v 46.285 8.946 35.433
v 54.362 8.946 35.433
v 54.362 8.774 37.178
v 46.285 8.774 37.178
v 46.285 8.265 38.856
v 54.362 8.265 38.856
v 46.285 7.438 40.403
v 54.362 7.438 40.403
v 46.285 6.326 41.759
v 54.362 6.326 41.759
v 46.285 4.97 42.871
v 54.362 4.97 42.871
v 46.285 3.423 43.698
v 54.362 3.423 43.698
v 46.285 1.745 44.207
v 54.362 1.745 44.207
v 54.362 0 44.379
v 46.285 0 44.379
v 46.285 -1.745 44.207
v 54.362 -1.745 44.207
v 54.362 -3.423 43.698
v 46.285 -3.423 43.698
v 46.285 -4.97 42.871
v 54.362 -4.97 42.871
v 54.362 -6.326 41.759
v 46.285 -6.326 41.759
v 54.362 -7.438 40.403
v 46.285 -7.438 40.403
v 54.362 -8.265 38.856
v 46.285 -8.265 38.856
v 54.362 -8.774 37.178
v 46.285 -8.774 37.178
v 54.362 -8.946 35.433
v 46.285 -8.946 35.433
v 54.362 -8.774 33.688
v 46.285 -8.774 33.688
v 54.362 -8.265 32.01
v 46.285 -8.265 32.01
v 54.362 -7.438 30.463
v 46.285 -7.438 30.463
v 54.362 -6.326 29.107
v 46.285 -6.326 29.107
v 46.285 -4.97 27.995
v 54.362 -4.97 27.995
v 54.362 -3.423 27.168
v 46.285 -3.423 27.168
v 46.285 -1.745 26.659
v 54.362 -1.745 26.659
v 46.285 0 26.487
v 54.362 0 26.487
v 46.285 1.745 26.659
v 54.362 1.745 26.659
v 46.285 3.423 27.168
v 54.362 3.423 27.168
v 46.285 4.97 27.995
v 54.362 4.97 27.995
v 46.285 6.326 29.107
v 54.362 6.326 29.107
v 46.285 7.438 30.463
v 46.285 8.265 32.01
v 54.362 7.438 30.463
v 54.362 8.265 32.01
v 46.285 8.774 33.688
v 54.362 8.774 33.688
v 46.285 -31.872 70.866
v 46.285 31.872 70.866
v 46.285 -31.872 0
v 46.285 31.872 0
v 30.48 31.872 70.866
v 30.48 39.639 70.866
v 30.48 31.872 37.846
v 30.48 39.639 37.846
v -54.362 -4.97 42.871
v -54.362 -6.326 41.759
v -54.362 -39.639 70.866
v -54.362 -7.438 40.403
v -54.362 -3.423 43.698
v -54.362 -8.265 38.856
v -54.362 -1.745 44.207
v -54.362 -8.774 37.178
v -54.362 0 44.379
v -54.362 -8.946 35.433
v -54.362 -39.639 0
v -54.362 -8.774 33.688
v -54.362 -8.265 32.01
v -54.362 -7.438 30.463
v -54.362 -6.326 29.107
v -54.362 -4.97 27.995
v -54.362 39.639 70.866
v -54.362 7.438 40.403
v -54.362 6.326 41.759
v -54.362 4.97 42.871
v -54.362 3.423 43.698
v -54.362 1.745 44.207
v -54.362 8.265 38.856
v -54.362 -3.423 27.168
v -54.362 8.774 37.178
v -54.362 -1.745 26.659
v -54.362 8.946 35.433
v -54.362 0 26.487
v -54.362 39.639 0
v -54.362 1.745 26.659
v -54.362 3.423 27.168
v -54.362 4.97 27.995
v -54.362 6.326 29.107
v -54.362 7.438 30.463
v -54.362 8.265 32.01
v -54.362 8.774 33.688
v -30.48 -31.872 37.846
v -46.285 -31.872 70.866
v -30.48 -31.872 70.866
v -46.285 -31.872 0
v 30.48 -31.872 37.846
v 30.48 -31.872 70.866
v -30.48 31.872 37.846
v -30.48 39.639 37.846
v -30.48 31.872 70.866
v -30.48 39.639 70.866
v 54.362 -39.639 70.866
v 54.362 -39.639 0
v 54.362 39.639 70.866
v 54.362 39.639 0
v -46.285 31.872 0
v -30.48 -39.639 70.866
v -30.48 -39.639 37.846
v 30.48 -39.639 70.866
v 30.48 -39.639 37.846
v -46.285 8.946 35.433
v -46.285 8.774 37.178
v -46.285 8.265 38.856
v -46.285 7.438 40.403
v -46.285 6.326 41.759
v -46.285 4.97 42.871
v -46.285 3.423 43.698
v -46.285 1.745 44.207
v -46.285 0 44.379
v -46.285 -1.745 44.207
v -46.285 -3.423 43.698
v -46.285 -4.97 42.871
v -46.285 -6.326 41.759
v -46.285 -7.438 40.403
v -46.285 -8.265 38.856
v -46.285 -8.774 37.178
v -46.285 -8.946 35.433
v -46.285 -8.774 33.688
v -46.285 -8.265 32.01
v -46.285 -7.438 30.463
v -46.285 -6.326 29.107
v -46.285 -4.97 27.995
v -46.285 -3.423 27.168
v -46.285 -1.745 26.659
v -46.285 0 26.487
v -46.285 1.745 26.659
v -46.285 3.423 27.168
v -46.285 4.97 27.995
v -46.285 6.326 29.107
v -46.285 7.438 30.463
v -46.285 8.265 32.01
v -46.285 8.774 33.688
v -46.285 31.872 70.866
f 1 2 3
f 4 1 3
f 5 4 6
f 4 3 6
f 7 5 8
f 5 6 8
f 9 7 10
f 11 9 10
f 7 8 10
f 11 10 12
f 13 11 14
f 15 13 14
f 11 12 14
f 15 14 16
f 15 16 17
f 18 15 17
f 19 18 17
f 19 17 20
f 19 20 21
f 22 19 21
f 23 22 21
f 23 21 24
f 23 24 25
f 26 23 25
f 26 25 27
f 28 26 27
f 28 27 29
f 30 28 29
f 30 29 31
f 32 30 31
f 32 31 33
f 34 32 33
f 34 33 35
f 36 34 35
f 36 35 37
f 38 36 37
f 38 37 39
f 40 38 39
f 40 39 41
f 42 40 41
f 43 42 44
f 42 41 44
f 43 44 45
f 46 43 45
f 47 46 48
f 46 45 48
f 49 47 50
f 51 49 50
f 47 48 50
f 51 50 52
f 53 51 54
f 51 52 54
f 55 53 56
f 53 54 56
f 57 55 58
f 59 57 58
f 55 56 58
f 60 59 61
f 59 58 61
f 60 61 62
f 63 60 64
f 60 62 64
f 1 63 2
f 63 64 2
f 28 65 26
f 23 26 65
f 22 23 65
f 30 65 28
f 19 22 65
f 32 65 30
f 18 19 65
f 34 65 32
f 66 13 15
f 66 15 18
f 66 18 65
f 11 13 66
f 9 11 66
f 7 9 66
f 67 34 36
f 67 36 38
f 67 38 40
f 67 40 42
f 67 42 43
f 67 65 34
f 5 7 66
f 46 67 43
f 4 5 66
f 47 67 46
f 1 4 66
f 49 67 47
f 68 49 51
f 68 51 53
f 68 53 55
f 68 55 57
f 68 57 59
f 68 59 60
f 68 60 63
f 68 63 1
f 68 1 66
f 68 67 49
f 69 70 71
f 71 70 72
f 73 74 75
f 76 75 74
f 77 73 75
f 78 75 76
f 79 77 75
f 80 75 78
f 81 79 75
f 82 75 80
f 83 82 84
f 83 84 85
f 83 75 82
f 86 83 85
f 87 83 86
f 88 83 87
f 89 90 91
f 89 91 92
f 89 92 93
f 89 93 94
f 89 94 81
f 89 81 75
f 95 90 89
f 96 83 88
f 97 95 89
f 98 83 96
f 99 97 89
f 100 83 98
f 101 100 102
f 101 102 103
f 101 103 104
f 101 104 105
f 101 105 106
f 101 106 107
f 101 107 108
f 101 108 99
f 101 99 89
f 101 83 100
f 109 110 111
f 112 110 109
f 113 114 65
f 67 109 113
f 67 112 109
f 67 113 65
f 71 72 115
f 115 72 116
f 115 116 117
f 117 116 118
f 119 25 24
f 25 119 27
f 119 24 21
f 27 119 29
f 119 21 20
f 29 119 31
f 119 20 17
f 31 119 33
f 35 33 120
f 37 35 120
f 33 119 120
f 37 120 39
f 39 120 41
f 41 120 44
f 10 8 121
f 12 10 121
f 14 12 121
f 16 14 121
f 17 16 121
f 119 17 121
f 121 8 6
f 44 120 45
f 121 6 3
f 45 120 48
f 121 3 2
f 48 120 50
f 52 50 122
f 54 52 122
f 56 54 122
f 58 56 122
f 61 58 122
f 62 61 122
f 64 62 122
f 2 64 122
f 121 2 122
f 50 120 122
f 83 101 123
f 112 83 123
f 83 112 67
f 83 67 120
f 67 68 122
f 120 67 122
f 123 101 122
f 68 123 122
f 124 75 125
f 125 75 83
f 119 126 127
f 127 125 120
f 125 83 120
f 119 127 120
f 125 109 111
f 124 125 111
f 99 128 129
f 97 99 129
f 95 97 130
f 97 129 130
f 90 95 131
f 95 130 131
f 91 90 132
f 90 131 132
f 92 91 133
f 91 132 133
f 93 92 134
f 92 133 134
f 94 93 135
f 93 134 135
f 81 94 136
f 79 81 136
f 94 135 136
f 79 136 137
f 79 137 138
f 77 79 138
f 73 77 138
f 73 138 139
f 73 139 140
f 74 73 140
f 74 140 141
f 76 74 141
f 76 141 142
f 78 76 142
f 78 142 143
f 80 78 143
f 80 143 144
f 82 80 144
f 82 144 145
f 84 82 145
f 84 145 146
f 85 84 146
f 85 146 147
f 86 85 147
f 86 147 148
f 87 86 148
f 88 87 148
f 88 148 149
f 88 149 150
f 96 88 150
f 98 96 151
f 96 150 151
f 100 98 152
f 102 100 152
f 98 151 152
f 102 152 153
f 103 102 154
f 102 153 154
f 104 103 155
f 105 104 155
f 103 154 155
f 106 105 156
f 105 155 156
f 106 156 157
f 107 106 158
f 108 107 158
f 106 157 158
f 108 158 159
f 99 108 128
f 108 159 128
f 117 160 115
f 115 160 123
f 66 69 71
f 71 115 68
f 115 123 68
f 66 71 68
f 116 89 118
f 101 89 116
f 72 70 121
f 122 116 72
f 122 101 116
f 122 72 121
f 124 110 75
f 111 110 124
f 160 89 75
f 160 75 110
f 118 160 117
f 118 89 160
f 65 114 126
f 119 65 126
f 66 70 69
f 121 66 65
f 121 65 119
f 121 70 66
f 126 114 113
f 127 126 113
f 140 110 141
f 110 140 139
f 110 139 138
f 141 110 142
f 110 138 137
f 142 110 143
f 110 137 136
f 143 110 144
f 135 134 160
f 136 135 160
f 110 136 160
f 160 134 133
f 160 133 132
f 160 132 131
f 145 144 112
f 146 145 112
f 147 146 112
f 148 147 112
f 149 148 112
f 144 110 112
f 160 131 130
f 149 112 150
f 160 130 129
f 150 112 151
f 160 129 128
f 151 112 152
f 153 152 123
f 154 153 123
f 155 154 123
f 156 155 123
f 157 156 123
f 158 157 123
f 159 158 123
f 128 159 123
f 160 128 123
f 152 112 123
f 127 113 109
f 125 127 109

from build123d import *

# Parameters (mm, degrees)
F0_W     = 108.723074
F0_H     = 79.27715
F0_W_2   = 92.569218
F0_H_2   = 63.744598
F1_DEPTH = 70.866
F2_R     = 8.945792
F3_DEPTH = 254
F5_DEPTH = 254


with BuildPart() as f1:
    # F0 (on Top) → F1 (new body)
    with BuildSketch(Plane.XY):
        Rectangle(F0_W, F0_H)
        Rectangle(F0_W_2, F0_H_2, mode=Mode.SUBTRACT)
    extrude(amount=F1_DEPTH)

    # F2 (on face) → F3 (cut)
    with BuildSketch(Plane.YZ.offset(54.361537)):
        with Locations((0, 35.433)):
            Circle(F2_R)
    extrude(amount=-F3_DEPTH, mode=Mode.SUBTRACT)

    # F4 (on face) → F5 (cut)
    with BuildSketch(Plane(origin=(0, 39.638575, 0), x_dir=(-1, 0, 0), z_dir=(0, 1, 0))):
        Polygon((30.48, 70.866), (0, 70.866), (-30.48, 70.866), (-30.48, 37.846), (30.48, 37.846), align=None)
    extrude(amount=-F5_DEPTH, mode=Mode.SUBTRACT)


solid = f1.part
